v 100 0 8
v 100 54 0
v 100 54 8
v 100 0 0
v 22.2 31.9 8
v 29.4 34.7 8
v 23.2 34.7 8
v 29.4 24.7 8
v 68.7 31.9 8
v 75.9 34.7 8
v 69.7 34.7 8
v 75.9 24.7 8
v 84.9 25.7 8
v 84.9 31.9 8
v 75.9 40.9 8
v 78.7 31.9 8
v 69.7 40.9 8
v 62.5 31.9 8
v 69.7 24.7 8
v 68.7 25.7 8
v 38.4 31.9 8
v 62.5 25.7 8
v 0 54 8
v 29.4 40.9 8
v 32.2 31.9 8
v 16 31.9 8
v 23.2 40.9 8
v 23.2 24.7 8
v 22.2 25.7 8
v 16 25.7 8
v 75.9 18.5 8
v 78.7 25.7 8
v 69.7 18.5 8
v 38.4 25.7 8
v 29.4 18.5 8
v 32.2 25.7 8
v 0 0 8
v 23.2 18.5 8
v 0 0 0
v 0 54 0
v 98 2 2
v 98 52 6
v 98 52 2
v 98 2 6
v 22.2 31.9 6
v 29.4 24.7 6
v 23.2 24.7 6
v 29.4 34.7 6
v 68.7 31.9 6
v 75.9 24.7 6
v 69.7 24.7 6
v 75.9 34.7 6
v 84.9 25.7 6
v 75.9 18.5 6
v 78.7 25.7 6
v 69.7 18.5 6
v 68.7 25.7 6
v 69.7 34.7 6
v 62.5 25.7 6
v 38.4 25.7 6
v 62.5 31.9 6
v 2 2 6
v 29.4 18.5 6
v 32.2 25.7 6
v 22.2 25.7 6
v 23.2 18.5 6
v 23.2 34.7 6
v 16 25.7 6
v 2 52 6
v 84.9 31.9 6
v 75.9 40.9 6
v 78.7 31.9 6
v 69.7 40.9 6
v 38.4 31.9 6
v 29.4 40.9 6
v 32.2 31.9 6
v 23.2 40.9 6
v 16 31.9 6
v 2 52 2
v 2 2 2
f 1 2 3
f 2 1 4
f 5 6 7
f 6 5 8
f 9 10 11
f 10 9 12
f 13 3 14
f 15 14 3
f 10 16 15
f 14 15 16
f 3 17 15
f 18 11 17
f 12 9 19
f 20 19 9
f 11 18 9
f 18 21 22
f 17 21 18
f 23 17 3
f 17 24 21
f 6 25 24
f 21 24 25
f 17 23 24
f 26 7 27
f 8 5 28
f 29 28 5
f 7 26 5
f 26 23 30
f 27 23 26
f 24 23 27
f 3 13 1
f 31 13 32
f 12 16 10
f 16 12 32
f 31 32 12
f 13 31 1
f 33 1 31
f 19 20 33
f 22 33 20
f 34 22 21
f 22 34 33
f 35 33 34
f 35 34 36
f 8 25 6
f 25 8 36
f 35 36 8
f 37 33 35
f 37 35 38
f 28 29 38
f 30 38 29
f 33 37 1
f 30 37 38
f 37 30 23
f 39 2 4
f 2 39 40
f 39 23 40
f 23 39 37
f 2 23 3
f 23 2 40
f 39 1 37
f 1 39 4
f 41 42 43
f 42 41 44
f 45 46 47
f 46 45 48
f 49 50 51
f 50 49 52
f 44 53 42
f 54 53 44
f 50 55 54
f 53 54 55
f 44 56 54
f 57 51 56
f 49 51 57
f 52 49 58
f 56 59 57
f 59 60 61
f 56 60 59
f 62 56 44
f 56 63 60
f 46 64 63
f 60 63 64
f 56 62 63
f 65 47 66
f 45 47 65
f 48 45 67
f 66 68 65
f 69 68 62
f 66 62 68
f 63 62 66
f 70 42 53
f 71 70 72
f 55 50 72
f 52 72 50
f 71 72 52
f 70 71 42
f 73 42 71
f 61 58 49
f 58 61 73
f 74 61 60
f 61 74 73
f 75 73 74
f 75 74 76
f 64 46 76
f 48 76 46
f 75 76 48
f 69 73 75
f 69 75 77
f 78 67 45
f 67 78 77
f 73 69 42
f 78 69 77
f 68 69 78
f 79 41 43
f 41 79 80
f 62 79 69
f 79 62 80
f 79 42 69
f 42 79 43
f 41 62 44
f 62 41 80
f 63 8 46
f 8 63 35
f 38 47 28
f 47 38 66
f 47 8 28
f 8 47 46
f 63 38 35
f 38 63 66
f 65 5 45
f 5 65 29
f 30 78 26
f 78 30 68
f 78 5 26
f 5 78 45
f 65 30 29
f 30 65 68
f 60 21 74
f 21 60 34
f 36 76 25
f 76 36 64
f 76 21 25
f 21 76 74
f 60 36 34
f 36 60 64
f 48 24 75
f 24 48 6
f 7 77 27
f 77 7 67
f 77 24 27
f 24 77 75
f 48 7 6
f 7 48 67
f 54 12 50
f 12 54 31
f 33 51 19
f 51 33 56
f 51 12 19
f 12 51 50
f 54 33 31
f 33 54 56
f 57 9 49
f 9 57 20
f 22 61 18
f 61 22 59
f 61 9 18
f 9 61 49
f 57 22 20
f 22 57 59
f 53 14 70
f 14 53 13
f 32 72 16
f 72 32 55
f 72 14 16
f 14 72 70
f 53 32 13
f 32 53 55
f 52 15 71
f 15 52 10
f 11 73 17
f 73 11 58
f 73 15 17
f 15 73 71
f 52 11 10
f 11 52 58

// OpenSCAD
button_x = 6.2;
button_y = button_x;
crossins_x = 9;
crossins_y = crossins_x;
ant_x = 14;
ant_y = 2;

module outer() {
	difference() {
		cube([100, 54, 8]);
		translate([2,2,2]) cube([96, 50, 4]);
	}
}

module button(x, y) {
	translate([x, y, 5]) cube([button_x, button_y, 4]);
}

module crossb(x, y) {
	union() {
		button(x + button_x + 1, y);
		button(x, y + button_y + 1);
		button(x + button_x + 1, y);
		button(x + button_x + crossins_x + 1, y + button_y + 1);
		button(x + button_x + 1, y + button_y + crossins_y + 1);
	}
}

difference() { 
	outer();
	union() {
		crossb(16, 18.5);
		crossb(62.5, 18.5);
	}
}
